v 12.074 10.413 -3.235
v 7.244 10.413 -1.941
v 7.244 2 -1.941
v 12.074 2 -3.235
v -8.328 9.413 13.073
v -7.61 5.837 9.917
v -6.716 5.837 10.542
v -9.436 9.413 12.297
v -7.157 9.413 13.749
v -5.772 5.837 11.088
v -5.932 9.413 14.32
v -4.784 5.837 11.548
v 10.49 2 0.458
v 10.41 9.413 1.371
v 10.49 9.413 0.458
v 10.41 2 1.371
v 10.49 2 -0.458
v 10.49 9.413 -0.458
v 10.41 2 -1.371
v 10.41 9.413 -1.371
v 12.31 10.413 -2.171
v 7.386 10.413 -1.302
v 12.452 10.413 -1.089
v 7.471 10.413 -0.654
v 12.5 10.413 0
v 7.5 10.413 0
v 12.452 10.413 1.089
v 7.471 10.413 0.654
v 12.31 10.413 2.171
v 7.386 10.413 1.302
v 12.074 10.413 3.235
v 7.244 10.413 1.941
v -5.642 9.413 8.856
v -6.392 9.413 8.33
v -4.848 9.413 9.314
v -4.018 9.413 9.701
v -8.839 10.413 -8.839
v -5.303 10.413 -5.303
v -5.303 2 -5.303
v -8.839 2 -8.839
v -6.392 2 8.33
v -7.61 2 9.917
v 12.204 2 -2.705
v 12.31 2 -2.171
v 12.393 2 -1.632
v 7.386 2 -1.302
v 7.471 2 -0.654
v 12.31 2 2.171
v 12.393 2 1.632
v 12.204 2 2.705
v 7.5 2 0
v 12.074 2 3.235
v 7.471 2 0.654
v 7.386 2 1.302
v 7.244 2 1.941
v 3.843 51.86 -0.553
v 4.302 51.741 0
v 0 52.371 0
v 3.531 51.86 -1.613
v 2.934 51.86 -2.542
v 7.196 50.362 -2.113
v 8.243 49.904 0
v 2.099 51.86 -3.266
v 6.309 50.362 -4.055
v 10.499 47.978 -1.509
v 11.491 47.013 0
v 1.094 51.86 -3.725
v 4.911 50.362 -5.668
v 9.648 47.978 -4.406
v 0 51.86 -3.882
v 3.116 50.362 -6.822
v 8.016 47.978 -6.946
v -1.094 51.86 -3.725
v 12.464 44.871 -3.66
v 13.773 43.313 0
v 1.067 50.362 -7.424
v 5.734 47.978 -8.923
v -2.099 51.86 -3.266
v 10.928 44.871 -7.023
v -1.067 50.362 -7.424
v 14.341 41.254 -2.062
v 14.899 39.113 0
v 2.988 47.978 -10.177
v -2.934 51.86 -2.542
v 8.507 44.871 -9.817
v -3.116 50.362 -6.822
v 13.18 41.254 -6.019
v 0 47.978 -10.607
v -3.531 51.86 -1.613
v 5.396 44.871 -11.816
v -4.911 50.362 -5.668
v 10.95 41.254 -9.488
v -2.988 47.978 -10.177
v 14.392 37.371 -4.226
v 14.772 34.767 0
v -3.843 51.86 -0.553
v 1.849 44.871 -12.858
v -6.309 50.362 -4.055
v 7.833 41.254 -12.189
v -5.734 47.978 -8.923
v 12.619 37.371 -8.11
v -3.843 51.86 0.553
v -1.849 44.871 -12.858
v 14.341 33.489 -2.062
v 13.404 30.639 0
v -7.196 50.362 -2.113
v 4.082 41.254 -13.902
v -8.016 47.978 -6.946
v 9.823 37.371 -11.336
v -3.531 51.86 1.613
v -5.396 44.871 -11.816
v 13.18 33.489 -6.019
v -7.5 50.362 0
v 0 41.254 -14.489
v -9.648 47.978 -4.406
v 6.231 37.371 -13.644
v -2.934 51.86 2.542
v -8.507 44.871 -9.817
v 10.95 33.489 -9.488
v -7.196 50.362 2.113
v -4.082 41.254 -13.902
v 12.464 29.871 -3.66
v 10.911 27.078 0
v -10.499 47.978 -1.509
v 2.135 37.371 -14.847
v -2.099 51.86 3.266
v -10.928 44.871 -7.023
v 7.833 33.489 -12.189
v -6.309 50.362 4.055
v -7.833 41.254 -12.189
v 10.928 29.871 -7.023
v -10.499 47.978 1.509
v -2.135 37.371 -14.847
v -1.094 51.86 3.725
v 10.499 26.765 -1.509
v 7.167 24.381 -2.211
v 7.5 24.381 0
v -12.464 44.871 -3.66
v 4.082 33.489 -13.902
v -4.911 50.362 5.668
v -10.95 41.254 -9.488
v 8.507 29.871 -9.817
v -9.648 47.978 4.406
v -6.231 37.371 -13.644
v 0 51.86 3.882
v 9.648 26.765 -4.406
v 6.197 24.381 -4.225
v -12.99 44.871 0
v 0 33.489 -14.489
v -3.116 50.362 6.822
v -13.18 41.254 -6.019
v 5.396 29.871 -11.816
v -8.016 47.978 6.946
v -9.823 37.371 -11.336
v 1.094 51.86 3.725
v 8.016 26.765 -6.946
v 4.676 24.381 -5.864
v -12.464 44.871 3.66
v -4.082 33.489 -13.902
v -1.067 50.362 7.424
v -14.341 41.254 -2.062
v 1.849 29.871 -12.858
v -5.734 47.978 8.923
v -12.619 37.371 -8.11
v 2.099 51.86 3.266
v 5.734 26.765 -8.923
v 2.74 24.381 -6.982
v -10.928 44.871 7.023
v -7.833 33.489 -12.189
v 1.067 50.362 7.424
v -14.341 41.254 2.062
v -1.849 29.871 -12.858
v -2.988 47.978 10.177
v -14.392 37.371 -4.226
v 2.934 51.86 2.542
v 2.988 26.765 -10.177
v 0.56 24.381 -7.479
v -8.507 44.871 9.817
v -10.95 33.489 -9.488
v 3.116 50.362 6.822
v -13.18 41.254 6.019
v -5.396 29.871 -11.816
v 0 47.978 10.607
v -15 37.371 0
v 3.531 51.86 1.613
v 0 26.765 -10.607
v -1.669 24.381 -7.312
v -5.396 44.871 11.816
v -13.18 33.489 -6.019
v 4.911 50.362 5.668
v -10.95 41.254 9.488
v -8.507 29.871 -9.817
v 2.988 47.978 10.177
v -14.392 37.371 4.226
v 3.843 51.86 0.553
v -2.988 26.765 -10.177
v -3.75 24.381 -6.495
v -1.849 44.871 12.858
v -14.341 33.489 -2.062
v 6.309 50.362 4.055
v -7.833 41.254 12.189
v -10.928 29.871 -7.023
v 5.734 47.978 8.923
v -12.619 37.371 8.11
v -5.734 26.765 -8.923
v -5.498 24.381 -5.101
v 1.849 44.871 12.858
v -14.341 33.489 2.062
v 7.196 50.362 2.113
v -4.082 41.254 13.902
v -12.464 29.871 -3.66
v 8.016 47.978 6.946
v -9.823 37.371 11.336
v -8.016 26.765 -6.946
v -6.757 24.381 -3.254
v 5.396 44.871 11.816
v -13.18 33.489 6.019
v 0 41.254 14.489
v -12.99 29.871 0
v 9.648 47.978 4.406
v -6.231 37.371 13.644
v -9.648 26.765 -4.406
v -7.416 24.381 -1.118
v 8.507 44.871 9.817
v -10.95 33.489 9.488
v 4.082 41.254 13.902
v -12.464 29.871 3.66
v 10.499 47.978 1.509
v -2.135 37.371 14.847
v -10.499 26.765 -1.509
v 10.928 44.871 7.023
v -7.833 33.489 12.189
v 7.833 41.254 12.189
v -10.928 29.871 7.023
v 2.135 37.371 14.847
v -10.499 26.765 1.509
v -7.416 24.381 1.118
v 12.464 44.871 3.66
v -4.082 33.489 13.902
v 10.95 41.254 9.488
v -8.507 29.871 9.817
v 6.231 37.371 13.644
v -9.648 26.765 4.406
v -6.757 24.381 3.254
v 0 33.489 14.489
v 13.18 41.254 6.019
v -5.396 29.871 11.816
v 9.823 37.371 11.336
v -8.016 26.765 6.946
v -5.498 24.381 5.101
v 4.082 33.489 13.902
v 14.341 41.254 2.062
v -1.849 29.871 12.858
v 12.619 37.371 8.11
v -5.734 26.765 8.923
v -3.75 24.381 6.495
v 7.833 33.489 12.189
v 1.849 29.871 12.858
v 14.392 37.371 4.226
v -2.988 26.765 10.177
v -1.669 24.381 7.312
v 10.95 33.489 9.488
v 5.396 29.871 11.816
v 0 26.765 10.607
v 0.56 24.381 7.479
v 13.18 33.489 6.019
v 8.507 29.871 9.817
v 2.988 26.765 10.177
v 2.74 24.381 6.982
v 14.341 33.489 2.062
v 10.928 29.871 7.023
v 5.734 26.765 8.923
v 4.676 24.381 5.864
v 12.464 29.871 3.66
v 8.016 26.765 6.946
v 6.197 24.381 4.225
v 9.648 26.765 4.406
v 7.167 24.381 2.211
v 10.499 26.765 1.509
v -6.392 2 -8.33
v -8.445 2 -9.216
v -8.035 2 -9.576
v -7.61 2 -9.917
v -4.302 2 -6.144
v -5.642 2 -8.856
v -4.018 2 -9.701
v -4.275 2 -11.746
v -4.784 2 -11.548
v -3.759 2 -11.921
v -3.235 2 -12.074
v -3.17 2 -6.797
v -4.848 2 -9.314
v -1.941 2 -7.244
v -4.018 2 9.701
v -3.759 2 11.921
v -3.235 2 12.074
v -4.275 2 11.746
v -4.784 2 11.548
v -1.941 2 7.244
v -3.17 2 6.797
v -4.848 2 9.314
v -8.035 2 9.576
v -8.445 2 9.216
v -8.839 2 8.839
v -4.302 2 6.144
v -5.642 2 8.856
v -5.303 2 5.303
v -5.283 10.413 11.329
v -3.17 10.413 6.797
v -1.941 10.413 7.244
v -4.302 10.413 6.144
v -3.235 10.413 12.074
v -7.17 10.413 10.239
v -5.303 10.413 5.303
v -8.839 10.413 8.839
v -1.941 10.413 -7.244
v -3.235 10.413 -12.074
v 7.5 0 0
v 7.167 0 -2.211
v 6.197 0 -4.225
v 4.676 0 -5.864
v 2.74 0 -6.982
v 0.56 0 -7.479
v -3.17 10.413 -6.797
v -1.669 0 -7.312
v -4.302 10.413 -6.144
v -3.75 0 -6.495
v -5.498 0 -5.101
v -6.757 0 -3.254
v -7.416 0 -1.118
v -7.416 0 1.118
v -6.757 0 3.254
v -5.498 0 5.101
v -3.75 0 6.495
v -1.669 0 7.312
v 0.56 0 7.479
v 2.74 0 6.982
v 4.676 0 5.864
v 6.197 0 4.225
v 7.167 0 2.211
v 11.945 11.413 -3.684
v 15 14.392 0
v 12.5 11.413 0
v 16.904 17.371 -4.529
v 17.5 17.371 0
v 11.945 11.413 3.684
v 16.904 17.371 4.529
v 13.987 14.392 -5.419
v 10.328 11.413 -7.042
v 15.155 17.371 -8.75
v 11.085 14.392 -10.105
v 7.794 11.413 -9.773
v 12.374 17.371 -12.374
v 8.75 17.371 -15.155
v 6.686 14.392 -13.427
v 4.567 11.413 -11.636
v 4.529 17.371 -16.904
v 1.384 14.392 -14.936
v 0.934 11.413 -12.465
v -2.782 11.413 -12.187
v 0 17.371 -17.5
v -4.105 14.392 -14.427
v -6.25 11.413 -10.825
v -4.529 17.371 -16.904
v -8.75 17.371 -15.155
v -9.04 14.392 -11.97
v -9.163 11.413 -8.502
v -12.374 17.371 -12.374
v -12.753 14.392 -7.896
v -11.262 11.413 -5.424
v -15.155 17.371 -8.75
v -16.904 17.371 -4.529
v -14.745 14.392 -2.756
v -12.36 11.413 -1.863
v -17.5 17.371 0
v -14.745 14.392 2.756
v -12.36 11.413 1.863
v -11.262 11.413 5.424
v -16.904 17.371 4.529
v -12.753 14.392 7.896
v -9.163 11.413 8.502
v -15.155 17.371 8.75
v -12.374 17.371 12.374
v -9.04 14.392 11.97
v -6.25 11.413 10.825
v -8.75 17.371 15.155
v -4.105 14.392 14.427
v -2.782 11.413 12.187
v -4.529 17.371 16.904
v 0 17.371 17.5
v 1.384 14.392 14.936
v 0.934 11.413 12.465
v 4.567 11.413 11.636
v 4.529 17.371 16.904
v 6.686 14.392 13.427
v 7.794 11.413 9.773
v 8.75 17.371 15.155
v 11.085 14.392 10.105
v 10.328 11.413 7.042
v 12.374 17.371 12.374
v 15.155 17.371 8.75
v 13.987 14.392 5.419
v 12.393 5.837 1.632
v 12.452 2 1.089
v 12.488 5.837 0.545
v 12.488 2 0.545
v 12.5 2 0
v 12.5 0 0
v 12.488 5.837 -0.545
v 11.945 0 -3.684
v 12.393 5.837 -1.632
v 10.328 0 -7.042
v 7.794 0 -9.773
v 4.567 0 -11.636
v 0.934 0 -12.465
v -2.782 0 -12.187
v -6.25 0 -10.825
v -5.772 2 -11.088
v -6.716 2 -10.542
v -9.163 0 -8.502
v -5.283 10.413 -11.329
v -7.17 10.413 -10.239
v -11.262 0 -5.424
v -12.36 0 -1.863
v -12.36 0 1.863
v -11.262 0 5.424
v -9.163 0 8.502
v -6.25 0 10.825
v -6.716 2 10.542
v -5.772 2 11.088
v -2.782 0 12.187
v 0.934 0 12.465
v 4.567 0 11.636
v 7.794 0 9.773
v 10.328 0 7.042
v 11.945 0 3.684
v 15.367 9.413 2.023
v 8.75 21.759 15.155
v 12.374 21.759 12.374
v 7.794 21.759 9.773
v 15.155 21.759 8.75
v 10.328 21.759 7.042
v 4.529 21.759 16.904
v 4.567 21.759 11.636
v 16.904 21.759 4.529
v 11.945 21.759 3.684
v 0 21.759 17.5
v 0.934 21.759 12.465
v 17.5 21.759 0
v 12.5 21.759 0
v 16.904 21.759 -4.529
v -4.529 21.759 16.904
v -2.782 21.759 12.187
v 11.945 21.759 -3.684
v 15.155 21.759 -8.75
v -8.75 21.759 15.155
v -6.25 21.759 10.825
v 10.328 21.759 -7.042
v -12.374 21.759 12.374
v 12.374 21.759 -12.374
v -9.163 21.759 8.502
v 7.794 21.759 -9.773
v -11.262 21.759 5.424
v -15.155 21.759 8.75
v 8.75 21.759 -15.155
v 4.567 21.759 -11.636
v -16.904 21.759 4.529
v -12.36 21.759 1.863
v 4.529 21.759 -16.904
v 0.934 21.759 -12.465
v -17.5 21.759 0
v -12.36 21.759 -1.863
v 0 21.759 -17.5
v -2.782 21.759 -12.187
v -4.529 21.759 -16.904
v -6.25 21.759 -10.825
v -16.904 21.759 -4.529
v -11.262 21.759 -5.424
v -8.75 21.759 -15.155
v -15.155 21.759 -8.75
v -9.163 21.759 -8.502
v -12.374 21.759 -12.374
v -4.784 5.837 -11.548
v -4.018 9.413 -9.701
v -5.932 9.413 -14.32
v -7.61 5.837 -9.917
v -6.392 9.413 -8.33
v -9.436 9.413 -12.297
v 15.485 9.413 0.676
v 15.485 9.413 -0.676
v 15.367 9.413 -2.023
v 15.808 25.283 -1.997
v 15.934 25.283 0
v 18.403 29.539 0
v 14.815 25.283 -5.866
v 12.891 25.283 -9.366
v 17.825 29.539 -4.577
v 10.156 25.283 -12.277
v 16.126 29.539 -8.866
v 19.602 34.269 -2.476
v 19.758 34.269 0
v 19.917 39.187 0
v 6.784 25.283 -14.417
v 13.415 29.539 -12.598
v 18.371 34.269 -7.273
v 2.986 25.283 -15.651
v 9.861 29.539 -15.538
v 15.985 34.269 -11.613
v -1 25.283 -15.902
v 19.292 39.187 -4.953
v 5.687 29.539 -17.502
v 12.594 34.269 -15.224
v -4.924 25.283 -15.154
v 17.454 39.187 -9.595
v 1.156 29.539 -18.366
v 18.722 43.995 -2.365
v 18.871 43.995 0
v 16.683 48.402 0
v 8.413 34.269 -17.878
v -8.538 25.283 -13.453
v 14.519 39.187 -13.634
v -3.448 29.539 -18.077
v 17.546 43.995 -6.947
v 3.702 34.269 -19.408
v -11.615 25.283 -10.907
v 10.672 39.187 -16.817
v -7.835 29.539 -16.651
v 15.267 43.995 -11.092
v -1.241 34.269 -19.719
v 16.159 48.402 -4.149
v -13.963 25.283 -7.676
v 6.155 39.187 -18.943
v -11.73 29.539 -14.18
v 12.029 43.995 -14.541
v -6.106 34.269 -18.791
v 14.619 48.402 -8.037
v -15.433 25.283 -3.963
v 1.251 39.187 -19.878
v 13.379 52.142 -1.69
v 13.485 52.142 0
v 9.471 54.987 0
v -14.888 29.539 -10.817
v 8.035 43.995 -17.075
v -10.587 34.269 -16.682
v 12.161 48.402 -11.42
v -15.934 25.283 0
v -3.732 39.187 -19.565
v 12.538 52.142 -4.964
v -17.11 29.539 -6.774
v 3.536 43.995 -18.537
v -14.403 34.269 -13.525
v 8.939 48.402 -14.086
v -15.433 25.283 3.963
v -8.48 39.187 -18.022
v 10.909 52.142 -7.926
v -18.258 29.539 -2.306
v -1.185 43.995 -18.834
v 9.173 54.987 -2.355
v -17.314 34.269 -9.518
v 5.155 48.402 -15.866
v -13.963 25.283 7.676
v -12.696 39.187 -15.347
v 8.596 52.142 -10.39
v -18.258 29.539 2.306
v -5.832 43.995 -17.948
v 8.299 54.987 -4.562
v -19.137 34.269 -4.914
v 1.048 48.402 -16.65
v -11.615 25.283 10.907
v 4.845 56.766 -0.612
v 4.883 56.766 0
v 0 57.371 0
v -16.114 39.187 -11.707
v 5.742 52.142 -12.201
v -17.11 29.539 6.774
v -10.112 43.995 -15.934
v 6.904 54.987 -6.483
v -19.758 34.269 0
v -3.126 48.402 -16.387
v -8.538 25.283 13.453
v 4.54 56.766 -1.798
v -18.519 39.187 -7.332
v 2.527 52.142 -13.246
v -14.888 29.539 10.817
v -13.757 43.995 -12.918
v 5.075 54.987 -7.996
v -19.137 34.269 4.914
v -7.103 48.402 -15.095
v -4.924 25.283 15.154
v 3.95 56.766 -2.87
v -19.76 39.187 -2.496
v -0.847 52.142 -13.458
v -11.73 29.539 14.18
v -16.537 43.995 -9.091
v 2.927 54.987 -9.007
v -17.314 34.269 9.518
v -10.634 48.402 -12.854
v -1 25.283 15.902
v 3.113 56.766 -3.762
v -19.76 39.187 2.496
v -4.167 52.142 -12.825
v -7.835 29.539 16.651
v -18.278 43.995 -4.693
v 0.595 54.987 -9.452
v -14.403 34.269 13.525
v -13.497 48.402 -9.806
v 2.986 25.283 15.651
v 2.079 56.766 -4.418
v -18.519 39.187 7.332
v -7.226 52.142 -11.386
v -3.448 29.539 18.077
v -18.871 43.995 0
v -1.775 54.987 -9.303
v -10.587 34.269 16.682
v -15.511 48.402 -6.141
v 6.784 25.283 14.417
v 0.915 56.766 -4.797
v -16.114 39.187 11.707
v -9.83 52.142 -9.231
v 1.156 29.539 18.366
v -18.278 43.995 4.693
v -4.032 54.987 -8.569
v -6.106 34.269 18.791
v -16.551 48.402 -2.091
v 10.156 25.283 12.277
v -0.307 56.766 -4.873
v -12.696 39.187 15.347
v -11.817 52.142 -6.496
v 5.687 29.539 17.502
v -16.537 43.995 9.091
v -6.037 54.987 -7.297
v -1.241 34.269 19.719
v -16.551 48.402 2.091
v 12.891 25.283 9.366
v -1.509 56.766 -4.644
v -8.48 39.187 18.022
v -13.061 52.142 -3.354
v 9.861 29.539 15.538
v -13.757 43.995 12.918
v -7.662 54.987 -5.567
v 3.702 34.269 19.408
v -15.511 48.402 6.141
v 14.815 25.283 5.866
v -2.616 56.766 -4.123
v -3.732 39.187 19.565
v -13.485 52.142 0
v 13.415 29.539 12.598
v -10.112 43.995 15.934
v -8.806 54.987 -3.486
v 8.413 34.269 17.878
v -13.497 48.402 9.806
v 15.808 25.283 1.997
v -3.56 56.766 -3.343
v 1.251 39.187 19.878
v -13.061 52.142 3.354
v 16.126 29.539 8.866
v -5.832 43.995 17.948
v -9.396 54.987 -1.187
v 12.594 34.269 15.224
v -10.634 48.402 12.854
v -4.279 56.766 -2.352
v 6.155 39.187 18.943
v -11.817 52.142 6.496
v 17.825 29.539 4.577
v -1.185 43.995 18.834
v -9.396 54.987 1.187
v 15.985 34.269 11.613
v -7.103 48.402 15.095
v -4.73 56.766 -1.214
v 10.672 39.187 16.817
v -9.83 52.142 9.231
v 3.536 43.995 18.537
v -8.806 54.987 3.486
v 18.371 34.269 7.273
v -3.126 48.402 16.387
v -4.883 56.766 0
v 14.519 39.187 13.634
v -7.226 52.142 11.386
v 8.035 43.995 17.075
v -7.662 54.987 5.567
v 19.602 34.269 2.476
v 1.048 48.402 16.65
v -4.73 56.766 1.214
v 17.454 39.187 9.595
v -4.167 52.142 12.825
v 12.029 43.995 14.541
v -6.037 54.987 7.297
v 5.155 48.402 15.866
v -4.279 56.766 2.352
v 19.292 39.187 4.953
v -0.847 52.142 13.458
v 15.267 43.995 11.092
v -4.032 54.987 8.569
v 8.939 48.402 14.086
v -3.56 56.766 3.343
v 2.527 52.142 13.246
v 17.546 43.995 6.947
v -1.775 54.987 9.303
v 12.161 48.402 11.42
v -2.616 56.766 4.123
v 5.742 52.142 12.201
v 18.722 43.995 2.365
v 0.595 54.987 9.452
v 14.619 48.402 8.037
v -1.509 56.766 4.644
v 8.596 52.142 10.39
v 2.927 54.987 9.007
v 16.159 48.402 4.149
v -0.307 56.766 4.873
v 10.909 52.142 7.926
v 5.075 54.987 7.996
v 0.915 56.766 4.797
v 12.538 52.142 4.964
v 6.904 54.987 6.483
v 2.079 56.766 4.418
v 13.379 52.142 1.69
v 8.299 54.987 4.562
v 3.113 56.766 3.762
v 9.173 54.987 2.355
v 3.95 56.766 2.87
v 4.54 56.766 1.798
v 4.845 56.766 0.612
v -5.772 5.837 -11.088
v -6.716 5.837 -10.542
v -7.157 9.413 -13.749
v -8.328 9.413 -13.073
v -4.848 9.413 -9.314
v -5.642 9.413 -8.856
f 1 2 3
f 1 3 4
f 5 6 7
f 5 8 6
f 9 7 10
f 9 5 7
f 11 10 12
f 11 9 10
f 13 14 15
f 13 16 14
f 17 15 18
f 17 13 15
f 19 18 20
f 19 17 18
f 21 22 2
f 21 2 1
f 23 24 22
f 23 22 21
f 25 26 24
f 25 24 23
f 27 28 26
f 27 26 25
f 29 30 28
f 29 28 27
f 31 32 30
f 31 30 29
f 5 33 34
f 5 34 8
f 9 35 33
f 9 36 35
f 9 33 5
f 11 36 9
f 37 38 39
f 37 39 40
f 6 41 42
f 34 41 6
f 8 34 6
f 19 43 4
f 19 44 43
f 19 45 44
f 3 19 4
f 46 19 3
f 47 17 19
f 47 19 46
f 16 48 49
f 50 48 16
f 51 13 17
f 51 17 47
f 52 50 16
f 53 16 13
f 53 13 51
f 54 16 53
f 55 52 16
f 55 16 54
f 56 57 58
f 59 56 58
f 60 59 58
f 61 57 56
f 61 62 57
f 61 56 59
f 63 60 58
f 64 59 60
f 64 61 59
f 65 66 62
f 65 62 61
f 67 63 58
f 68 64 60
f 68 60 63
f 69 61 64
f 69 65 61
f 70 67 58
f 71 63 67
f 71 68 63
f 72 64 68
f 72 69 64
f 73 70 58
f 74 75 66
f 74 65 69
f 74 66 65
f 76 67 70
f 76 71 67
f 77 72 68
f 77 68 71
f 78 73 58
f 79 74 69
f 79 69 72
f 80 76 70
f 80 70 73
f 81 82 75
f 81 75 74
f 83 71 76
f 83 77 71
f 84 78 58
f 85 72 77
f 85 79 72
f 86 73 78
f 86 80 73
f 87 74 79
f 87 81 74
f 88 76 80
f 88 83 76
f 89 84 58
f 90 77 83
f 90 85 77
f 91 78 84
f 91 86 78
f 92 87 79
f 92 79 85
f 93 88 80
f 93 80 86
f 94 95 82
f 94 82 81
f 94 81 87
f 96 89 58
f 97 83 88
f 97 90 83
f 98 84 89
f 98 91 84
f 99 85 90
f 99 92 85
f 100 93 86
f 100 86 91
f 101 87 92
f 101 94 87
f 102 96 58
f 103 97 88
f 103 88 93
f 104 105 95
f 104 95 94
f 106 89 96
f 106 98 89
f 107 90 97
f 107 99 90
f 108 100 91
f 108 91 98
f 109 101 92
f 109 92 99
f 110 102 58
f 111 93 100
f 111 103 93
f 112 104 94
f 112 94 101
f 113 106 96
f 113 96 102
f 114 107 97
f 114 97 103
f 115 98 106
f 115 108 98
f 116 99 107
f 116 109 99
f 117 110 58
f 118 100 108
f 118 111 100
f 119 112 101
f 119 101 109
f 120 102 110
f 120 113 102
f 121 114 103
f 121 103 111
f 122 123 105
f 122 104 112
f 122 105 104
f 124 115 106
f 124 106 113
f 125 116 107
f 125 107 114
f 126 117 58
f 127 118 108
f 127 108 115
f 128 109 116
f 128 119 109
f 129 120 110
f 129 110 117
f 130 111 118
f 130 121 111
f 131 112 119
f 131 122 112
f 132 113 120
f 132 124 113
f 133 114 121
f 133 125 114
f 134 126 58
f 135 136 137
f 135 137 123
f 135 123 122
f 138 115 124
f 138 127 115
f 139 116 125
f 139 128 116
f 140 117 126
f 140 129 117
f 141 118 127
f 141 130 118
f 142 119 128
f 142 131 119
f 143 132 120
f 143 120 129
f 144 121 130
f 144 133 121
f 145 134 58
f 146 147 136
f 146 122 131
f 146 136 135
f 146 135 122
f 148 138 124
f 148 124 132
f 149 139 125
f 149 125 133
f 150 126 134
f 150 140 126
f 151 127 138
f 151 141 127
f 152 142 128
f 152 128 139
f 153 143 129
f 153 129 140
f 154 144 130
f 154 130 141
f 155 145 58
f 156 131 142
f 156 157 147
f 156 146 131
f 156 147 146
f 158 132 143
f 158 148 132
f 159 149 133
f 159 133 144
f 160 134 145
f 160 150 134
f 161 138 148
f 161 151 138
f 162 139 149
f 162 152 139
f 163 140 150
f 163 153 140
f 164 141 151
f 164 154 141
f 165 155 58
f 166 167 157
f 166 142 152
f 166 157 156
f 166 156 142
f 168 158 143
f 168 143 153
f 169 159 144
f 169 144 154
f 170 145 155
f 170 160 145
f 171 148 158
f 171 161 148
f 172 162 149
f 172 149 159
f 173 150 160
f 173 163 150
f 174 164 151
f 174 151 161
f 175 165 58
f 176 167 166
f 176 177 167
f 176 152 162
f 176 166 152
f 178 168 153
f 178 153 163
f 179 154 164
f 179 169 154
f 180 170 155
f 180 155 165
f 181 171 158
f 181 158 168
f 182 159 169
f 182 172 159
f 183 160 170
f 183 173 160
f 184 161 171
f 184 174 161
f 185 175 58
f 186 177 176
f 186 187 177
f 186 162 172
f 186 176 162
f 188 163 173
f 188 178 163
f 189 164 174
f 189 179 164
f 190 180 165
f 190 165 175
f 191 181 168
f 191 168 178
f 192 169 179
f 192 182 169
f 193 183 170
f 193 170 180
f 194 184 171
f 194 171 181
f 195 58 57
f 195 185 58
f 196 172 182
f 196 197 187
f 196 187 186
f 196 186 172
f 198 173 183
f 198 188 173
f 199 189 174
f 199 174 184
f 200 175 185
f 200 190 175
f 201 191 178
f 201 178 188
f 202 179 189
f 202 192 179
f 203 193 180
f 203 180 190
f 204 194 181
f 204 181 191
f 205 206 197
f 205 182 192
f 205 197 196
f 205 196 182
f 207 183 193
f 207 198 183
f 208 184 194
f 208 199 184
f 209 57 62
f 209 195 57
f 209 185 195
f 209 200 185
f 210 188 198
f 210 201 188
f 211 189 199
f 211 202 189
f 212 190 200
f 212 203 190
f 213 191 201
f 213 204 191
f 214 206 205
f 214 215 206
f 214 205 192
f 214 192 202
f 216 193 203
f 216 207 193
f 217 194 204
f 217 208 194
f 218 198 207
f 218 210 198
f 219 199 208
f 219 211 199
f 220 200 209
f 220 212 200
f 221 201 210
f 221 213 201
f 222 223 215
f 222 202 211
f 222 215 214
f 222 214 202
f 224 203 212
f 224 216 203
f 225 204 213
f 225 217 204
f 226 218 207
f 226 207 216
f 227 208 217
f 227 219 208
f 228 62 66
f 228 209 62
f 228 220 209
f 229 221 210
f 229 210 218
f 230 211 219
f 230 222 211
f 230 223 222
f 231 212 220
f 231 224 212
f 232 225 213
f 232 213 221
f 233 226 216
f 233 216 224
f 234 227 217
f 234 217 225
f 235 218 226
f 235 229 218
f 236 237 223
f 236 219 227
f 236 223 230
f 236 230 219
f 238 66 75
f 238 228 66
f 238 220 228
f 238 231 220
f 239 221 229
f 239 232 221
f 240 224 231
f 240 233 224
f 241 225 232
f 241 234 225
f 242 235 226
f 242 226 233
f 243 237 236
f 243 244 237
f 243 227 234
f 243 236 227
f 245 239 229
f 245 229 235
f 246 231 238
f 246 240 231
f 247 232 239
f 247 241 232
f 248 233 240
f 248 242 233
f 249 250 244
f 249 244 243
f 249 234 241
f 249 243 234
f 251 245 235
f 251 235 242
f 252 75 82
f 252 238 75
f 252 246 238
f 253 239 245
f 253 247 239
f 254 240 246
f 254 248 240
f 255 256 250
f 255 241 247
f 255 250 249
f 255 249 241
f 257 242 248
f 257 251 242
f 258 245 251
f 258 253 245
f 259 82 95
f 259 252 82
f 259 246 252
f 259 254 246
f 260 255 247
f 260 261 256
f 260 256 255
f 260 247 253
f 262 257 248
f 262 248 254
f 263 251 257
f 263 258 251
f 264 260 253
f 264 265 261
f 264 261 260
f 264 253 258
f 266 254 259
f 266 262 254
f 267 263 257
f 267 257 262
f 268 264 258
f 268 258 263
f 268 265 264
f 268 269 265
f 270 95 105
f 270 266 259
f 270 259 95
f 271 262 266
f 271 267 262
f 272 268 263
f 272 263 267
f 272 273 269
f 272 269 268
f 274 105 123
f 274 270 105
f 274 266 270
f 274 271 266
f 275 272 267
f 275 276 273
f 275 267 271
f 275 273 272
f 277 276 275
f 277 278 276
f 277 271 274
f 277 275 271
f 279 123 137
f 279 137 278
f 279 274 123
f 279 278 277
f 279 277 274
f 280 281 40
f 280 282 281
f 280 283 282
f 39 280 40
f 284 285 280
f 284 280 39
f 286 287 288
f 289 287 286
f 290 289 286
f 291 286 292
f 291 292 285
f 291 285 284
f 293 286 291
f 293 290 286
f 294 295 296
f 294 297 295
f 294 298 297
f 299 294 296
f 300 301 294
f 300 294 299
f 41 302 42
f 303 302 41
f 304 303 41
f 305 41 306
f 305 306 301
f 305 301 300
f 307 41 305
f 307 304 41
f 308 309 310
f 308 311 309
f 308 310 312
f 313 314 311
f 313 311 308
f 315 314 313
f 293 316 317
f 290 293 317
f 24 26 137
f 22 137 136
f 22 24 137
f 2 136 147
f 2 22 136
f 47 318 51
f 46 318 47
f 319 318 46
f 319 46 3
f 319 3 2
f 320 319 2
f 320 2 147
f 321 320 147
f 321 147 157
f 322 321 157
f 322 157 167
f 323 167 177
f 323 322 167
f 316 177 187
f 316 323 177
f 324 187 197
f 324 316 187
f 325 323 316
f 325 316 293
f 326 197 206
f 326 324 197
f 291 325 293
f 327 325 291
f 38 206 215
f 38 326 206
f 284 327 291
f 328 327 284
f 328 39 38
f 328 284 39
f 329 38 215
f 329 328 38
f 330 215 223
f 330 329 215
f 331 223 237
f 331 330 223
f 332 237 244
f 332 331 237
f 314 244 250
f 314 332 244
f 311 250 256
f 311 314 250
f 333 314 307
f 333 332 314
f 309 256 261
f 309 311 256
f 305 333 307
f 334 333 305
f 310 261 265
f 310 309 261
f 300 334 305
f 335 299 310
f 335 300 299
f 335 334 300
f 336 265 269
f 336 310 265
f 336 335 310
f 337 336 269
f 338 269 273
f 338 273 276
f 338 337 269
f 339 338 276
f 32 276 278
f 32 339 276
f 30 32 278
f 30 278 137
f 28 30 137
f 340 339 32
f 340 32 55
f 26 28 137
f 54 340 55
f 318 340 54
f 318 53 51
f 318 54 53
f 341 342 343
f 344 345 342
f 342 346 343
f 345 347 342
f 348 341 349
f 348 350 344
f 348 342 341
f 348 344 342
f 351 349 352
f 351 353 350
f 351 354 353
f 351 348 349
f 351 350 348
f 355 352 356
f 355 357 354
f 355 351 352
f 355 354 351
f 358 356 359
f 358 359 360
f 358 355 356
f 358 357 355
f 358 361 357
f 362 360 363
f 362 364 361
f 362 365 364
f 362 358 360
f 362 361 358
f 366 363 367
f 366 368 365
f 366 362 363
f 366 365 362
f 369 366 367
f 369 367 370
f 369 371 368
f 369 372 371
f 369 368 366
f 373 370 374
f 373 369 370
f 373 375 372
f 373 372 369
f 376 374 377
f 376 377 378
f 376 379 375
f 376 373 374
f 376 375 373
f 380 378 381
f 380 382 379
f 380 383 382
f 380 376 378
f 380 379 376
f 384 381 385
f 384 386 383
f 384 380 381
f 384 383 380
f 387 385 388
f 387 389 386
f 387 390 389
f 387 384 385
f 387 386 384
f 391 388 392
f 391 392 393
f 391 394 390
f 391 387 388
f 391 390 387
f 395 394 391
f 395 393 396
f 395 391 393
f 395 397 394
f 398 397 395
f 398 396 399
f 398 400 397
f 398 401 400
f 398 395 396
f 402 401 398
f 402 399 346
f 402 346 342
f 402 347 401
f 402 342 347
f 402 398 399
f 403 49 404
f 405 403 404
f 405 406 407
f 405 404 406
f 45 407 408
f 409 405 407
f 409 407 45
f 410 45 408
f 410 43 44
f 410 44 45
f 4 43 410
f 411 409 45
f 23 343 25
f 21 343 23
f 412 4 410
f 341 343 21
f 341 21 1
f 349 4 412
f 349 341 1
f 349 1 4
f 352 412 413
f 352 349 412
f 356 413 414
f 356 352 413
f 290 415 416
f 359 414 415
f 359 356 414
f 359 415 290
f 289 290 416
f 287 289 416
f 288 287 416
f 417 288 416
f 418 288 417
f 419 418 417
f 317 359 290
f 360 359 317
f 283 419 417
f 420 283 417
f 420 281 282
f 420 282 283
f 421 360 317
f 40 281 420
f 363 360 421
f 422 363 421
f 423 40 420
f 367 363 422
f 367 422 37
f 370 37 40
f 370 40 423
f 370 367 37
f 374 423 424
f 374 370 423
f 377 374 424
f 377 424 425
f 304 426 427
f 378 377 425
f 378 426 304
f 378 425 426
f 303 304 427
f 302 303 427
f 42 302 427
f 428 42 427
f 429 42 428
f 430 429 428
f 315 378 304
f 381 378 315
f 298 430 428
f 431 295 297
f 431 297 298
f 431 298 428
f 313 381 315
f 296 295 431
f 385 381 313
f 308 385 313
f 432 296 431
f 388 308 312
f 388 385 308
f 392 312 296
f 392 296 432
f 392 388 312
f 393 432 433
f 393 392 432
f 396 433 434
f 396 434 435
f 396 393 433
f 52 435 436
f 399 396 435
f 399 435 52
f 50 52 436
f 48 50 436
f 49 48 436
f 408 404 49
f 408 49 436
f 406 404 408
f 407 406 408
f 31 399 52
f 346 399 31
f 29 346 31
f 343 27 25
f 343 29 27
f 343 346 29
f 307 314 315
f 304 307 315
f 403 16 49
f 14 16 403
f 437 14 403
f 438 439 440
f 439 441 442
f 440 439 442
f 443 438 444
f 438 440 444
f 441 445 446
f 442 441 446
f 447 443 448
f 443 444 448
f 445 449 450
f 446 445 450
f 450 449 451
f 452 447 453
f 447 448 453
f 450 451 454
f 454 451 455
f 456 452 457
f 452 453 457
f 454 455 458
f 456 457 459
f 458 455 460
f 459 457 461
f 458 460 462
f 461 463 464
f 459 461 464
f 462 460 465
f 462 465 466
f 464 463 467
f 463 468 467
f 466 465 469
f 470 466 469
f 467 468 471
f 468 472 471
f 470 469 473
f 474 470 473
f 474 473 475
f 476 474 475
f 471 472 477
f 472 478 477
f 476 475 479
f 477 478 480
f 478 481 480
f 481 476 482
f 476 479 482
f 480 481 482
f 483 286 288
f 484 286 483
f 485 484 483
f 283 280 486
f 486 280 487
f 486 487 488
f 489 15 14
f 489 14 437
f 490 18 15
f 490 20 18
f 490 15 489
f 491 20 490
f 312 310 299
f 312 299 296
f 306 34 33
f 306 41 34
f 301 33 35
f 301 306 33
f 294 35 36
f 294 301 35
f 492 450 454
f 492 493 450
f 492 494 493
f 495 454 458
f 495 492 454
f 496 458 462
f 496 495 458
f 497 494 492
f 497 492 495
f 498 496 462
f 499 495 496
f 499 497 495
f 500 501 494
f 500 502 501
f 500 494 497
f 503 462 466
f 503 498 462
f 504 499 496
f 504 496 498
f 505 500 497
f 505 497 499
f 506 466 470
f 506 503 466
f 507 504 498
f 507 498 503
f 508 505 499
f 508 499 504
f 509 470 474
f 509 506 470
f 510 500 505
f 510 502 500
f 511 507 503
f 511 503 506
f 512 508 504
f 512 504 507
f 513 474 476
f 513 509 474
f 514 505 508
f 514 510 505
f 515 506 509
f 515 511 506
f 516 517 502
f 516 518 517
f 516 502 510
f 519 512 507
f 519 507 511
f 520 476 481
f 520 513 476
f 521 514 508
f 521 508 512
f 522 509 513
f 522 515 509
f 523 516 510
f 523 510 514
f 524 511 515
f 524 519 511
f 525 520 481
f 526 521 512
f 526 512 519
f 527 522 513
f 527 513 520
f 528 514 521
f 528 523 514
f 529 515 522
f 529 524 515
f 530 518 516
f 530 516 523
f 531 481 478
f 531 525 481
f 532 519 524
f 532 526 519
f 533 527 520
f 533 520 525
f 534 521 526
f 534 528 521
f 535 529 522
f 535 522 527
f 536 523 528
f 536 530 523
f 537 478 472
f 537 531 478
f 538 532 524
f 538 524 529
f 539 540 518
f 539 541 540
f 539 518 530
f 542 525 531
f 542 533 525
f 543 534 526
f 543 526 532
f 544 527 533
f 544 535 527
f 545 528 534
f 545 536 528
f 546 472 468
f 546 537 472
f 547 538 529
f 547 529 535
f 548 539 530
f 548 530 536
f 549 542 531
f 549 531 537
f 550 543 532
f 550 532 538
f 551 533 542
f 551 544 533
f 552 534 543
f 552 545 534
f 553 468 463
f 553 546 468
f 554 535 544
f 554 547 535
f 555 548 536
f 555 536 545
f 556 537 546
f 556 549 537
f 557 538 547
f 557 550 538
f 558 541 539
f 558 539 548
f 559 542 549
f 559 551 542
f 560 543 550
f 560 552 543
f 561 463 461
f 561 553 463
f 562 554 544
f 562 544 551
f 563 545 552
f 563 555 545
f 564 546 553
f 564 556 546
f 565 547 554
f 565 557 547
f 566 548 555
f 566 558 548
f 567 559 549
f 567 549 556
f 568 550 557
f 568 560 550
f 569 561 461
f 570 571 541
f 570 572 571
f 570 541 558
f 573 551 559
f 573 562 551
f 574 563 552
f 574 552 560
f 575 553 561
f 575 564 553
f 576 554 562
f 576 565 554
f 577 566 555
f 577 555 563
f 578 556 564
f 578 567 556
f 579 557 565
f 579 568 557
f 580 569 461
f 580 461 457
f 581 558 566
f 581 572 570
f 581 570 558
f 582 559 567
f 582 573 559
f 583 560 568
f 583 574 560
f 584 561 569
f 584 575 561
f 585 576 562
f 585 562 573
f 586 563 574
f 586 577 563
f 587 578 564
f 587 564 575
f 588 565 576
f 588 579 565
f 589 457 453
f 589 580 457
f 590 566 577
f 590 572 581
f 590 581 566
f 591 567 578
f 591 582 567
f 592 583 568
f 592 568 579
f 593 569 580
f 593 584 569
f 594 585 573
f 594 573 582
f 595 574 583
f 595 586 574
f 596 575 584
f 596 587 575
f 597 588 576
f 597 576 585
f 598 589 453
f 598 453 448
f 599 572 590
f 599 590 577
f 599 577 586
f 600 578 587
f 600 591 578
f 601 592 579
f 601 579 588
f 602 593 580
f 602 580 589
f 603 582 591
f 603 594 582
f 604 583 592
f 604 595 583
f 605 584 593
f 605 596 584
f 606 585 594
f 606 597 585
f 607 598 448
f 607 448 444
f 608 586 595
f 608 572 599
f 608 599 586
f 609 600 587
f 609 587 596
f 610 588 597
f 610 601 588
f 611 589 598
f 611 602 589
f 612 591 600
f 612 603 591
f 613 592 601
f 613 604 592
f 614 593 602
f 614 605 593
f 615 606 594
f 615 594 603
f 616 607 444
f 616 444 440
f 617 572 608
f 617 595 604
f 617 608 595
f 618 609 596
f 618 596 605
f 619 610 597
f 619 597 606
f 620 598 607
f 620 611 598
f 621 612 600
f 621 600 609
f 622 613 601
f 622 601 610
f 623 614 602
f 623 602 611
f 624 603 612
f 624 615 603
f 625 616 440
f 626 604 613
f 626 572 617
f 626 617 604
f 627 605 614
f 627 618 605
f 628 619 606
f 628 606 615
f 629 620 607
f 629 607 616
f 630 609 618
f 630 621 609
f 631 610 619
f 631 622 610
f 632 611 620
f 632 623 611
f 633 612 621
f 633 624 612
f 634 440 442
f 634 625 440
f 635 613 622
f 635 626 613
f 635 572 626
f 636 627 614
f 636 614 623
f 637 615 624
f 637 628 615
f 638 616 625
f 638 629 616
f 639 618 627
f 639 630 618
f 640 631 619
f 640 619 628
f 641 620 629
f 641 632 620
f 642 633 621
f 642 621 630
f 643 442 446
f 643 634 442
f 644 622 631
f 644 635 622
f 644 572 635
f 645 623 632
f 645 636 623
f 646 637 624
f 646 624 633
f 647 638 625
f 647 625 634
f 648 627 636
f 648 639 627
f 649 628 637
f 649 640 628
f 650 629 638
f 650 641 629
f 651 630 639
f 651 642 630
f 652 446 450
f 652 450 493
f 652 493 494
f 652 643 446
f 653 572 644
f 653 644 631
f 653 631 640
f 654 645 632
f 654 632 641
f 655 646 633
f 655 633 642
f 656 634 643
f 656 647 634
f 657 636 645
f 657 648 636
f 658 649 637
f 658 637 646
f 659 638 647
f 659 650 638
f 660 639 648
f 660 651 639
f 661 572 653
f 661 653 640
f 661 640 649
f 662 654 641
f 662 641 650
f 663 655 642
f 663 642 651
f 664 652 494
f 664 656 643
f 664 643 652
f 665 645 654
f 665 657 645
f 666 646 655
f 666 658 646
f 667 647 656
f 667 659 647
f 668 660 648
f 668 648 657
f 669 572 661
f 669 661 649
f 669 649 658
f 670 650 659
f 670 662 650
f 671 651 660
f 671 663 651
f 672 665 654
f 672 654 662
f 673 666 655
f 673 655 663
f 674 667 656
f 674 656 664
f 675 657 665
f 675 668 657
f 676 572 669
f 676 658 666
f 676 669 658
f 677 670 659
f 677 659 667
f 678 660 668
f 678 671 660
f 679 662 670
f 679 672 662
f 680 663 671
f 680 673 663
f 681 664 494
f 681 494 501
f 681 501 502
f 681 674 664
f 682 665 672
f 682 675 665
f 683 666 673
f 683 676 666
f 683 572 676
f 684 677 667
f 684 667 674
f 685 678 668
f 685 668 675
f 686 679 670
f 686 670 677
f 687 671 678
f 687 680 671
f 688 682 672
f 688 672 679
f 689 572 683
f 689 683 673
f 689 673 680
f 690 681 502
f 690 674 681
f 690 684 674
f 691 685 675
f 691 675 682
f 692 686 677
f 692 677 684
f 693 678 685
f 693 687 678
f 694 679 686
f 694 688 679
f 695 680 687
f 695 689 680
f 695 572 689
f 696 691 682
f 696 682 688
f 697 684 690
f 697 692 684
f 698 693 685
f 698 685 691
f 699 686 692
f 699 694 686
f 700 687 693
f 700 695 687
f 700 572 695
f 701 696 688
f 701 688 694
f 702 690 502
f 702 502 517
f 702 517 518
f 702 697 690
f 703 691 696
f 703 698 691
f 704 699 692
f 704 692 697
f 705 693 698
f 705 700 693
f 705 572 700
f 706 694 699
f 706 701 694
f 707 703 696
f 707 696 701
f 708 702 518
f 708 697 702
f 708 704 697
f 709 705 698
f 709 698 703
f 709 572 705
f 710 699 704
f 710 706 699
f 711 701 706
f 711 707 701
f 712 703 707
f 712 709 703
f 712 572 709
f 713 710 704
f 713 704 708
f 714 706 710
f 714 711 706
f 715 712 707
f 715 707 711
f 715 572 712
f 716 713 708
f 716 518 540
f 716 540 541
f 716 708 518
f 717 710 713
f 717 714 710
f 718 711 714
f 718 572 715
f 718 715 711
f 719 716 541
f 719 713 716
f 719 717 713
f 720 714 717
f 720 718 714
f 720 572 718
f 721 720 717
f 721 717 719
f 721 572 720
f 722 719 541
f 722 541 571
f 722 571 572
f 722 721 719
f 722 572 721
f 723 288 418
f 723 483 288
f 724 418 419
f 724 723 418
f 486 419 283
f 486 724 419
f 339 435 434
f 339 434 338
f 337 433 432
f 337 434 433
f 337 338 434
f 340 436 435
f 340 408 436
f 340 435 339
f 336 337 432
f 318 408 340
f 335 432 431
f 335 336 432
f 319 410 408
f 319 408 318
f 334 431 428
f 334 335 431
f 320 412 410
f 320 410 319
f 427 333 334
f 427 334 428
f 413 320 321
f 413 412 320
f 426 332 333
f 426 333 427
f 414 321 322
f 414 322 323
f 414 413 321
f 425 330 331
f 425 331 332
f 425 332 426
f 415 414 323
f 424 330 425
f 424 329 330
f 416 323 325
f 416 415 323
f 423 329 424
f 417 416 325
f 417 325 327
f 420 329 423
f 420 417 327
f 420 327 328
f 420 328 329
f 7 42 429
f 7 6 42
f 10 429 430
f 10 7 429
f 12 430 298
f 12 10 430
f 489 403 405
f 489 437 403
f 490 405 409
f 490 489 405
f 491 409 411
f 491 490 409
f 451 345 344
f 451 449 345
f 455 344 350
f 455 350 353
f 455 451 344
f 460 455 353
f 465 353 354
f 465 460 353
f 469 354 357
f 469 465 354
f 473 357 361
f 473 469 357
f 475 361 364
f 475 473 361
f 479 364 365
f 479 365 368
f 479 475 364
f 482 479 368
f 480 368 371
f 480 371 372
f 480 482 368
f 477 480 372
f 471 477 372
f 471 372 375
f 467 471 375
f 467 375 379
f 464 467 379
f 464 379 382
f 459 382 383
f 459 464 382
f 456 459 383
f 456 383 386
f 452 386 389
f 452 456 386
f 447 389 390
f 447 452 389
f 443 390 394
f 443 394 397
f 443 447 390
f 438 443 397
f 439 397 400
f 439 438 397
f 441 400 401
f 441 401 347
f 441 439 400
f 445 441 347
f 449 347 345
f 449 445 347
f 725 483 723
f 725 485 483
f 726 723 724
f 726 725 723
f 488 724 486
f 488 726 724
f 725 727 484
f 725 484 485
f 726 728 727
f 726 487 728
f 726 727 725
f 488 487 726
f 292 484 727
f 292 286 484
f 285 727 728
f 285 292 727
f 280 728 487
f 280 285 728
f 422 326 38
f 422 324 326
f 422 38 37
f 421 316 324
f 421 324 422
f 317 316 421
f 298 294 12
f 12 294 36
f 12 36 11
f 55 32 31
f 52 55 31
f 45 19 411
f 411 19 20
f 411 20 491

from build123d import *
from build123d import SkipClean  # not in build123d's __all__

# Parameters (mm, degrees)
F0_W            = 5
F0_H            = 4.387505004
F3_ANGLE_BACK   = 15
F3_ANGLE        = 30
F3_COPIES_COUNT = 3
F4_ANGLE_BACK   = 7.5
F4_ANGLE        = 15
F4_COPIES_COUNT = 3


# Not quite as in the source:
# - a pattern or mirror of a feature is missing from the dataset's text; its kind, count and spacing are read off the source's solid


with BuildPart() as f1:
    # F0 (on Top) → F1 (revolve)
    with BuildSketch(Plane.XY):
        with BuildLine():
            ThreePointArc((12.5, 21.7588313682), (18.8712731409, 43.9951507913), (0, 57.3713263642))
            Line((0, 57.3713263642), (0, 52.3713263642))
            ThreePointArc((0, 52.3713263642), (14.4888873943, 41.2536120408), (7.5, 24.3809453075))
            Line((7.5, 24.3809453075), (7.5, 18.8308301465))
            ThreePointArc((7.5, 18.8308301465), (10.1065967461, 20.1128008707), (12.5, 21.7588313682))
        make_face()
        with BuildLine():
            Line((12.5, 17.3713263642), (12.5, 21.7588313682))
            ThreePointArc((12.5, 21.7588313682), (10.1065967461, 20.1128008707), (7.5, 18.8308301465))
            Line((7.5, 18.8308301465), (7.5, 0))
            Line((7.5, 0), (12.5, 0))
            Line((12.5, 0), (12.5, 11.4125584013))
            Line((12.5, 11.4125584013), (12.5, 17.3713263642))
        make_face()
        with Locations((15, 19.5650788662)):
            Rectangle(F0_W, F0_H)
        Polygon((17.5, 17.3713263642), (12.5, 17.3713263642), (12.5, 11.4125584013), align=None)
    revolve(axis=Axis((0, 26.1856631821, 0), (0, 1, 0)))

    # F2 (on Top) → F3 (revolve, cut)
    with BuildSketch(Plane.XY, mode=Mode.PRIVATE) as f3_sk:
        Polygon((7.5, 10.4125584013), (7.5, 2), (10.5, 2), (10.5, 9.4125584013), (12.5, 9.4125584013), (12.5, 10.4125584013), align=None)
        Polygon((10.5, 2), (12.5, 2), (12.5, 5.8372976235), (12.5, 9.4125584013), (10.5, 9.4125584013), align=None)
    f3 = revolve(f3_sk.sketch.rotate(Axis((0, 0, 0), (0, -1, 0)), -F3_ANGLE_BACK), axis=Axis((0, 0, 0), (0, -1, 0)), revolution_arc=F3_ANGLE, mode=Mode.SUBTRACT)

    # F3_copies: F3 ×3 about axis
    f3_copies_axis = Axis((0, 0, 0), (0, 1, 0))
    for i in range(1, F3_COPIES_COUNT):
        add(f3.rotate(f3_copies_axis, i * 360 / F3_COPIES_COUNT), clean=False, mode=Mode.SUBTRACT)

    # F2 (on Top) → F4 (revolve)
    with BuildSketch(Plane.XY, mode=Mode.PRIVATE) as f4_sk:
        Polygon((12.5, 9.4125584013), (12.5, 5.8372976235), (15.5, 9.4125584013), align=None)
        Polygon((10.5, 2), (12.5, 2), (12.5, 5.8372976235), (12.5, 9.4125584013), (10.5, 9.4125584013), align=None)
    f4 = revolve(f4_sk.sketch.rotate(Axis((0, 0, 0), (0, 1, 0)), -F4_ANGLE_BACK), axis=Axis((0, 0, 0), (0, 1, 0)), revolution_arc=F4_ANGLE)

    # F4_copies: F4 ×3 about axis
    f4_copies_axis = Axis((0, 0, 0), (0, 1, 0))
    with SkipClean():  # cleaning this boolean's faces spoils the solid; the shape is the same uncleaned
        for i in range(1, F4_COPIES_COUNT):
            add(f4.rotate(f4_copies_axis, i * 360 / F4_COPIES_COUNT), clean=False)


solid = f1.part
